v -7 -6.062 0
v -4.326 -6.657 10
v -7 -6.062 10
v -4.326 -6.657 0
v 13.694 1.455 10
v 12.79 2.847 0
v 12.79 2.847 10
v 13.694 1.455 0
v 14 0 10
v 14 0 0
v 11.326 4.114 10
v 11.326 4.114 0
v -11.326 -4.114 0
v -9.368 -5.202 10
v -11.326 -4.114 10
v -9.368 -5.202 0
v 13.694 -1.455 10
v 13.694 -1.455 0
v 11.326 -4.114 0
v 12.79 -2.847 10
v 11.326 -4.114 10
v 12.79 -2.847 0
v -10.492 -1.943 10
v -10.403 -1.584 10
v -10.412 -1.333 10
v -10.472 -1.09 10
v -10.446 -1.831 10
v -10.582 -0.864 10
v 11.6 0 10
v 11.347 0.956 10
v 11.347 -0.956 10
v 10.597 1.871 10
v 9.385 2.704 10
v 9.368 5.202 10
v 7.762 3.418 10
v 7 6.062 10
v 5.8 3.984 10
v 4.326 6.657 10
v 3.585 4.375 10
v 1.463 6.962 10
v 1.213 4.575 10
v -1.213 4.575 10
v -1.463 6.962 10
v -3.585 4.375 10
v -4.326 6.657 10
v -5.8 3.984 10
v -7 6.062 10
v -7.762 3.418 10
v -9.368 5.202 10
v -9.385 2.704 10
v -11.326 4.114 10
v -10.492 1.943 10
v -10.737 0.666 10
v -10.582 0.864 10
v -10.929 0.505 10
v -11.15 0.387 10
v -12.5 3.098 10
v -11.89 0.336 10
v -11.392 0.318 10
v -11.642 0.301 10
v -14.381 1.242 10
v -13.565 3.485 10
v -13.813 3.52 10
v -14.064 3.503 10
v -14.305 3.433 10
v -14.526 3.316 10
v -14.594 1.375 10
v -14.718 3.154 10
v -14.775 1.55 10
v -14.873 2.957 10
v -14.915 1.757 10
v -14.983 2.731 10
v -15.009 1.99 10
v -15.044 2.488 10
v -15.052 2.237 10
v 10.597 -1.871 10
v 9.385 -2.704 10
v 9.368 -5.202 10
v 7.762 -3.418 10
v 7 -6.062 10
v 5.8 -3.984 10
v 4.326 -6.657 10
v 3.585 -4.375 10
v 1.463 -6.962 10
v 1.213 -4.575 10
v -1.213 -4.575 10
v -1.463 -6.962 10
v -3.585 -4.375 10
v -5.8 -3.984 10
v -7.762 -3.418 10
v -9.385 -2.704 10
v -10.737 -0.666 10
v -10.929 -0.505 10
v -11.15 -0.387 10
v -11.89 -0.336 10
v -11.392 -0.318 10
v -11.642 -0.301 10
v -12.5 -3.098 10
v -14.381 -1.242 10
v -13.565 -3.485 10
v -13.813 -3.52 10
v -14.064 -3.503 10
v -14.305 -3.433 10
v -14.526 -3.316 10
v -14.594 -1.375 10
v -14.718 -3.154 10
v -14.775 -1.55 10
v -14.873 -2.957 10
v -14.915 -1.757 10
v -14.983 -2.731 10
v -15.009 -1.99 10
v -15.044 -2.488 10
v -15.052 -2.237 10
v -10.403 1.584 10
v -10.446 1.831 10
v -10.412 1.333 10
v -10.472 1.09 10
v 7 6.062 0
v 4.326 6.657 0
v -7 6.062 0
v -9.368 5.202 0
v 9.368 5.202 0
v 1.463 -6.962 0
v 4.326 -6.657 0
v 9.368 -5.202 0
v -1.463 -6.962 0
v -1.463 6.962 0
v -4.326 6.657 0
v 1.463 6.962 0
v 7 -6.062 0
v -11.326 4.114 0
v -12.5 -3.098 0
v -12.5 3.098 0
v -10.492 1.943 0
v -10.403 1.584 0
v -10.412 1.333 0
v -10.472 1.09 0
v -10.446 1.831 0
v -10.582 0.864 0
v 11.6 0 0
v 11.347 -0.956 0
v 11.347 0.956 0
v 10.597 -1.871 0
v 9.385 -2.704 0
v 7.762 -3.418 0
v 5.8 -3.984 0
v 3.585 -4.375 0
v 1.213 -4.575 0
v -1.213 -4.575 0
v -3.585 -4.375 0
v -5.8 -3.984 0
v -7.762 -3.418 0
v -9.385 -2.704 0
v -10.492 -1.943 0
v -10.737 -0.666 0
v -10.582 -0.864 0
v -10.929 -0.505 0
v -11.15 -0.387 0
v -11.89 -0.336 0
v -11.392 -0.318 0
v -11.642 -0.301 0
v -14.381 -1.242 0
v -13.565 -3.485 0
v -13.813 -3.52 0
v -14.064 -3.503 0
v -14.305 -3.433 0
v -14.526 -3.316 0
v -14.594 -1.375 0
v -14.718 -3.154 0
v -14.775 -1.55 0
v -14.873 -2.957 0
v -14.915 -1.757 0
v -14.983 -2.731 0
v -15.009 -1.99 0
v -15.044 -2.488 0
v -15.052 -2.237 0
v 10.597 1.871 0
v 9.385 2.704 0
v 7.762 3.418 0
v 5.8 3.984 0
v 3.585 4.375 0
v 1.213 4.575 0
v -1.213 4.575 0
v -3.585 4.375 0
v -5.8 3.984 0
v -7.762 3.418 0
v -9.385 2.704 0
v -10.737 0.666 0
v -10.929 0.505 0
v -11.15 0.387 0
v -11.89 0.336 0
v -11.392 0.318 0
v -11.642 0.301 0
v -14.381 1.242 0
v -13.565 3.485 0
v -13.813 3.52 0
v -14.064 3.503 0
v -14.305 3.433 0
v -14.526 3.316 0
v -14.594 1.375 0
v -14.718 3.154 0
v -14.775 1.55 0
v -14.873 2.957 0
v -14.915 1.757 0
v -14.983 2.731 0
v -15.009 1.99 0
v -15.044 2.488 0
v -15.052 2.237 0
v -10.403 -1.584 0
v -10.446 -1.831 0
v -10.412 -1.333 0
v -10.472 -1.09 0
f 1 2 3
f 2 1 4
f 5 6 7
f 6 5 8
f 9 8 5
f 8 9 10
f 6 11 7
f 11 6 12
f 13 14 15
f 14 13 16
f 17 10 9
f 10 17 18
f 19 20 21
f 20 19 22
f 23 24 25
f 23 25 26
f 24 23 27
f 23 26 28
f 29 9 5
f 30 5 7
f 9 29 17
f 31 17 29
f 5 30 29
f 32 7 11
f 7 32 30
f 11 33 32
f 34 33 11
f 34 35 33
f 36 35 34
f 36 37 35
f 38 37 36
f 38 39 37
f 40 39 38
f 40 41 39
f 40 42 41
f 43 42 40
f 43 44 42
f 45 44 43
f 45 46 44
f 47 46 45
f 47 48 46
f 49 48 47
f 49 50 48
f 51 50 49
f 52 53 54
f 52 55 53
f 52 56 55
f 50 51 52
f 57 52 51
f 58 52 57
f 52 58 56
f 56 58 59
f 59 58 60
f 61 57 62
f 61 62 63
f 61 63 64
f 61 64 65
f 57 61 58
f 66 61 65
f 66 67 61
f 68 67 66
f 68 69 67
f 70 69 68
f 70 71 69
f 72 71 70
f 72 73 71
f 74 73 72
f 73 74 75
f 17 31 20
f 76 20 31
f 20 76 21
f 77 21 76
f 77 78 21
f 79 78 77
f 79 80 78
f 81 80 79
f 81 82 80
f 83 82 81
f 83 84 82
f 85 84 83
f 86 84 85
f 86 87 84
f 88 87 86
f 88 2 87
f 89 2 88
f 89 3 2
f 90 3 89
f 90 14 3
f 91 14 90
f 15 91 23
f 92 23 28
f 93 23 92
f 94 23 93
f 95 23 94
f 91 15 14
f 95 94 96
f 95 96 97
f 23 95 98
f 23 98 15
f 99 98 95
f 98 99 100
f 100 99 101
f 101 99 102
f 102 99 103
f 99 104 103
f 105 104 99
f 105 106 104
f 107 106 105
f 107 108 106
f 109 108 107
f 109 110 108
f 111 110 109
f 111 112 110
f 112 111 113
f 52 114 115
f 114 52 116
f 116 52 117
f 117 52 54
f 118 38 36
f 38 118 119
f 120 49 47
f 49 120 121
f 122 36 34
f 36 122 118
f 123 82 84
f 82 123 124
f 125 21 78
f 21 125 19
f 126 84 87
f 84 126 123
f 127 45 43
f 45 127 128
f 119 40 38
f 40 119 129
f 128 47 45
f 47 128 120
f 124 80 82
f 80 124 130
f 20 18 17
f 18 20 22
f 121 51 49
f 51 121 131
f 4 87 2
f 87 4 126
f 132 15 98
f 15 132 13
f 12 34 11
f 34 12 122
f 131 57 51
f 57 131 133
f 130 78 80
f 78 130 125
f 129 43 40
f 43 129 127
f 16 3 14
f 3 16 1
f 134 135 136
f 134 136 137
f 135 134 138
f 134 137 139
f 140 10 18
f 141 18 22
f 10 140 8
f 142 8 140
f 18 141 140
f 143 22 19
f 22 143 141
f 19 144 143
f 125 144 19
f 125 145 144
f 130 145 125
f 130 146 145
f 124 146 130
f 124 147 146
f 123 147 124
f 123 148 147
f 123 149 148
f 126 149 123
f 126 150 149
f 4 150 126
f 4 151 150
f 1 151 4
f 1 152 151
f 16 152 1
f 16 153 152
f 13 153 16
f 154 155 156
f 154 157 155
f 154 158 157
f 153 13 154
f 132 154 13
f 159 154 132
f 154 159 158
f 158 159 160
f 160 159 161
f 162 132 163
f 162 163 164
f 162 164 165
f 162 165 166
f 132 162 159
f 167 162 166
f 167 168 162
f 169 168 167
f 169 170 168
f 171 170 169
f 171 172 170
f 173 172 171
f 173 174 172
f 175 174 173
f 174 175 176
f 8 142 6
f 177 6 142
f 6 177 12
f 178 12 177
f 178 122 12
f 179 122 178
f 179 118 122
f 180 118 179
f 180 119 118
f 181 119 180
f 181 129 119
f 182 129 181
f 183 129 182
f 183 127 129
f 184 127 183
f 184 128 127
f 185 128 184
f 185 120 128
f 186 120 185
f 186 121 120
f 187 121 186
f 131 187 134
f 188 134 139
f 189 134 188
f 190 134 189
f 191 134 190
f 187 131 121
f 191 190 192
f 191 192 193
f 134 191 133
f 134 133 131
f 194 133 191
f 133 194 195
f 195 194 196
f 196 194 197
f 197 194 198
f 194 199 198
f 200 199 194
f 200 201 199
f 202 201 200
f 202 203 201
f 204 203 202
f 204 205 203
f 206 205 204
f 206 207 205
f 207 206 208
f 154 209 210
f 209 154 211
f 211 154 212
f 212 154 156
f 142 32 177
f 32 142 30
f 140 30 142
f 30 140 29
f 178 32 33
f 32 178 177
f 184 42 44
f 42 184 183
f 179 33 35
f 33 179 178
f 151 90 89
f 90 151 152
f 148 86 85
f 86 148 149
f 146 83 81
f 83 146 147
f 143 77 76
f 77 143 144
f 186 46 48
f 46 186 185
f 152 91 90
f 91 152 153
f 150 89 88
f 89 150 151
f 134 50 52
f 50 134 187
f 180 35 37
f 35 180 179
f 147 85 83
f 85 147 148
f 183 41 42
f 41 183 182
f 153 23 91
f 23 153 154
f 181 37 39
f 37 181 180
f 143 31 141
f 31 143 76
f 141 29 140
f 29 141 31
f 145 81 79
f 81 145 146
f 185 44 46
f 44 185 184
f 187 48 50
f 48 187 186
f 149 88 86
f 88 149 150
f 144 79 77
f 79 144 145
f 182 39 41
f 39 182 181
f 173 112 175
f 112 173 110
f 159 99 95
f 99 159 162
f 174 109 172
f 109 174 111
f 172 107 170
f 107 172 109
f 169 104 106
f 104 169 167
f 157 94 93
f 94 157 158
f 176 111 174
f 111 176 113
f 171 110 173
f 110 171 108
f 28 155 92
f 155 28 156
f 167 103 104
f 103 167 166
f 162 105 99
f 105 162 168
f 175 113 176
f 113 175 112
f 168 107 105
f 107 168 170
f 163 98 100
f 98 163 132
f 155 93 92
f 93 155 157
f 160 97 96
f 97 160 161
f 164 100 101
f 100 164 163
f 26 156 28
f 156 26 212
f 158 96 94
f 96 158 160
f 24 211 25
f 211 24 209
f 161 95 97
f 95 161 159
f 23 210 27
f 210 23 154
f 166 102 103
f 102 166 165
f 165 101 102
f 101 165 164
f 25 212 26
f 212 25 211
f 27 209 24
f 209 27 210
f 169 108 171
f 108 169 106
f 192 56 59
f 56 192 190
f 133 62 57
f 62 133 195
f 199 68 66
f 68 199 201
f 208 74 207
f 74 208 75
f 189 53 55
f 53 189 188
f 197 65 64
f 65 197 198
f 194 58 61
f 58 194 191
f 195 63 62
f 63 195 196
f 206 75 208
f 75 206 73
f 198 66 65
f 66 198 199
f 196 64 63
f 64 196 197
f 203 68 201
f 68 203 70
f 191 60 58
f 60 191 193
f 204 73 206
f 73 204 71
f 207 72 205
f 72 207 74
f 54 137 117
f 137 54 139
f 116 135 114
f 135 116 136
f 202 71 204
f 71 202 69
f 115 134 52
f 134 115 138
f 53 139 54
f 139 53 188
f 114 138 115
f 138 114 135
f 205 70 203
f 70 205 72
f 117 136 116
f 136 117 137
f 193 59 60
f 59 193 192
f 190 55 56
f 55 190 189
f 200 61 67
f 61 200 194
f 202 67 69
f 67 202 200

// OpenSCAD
$fn=30;

gap = 3;

module elips(long=28, short=14, height=10) {
  scale_y = short / long;
  scale([1,scale_y,1])
    cylinder(height, r=long / 2);
}

module clip(long=28, short=0, height=10, thickness=2.4) {
  real_short = short == 0 ? (long / 2) : short;
  t2 = (thickness * 2);
  difference() {
    elips(long,real_short,height);
    elips(long-t2,real_short-t2,height);
    translate([-(long/2), 0, height / 2])
      cube([long, gap, height], center=true);
  }
  module ending() {
    hull() {
        cylinder(height, r=thickness/2);
        translate([-thickness, 0, 0])
          cylinder(height, r=thickness/2);
    }
  }

  translate([-(long/2)+thickness, -gap/2, 0])
    rotate(20, [0, 0, 1])
      ending();
  translate([-(long/2)+thickness, gap/2, 0])
    rotate(-20, [0, 0, 1])
      ending();
}

clip(long=28, short=14, height=10, thickness=2.4);
